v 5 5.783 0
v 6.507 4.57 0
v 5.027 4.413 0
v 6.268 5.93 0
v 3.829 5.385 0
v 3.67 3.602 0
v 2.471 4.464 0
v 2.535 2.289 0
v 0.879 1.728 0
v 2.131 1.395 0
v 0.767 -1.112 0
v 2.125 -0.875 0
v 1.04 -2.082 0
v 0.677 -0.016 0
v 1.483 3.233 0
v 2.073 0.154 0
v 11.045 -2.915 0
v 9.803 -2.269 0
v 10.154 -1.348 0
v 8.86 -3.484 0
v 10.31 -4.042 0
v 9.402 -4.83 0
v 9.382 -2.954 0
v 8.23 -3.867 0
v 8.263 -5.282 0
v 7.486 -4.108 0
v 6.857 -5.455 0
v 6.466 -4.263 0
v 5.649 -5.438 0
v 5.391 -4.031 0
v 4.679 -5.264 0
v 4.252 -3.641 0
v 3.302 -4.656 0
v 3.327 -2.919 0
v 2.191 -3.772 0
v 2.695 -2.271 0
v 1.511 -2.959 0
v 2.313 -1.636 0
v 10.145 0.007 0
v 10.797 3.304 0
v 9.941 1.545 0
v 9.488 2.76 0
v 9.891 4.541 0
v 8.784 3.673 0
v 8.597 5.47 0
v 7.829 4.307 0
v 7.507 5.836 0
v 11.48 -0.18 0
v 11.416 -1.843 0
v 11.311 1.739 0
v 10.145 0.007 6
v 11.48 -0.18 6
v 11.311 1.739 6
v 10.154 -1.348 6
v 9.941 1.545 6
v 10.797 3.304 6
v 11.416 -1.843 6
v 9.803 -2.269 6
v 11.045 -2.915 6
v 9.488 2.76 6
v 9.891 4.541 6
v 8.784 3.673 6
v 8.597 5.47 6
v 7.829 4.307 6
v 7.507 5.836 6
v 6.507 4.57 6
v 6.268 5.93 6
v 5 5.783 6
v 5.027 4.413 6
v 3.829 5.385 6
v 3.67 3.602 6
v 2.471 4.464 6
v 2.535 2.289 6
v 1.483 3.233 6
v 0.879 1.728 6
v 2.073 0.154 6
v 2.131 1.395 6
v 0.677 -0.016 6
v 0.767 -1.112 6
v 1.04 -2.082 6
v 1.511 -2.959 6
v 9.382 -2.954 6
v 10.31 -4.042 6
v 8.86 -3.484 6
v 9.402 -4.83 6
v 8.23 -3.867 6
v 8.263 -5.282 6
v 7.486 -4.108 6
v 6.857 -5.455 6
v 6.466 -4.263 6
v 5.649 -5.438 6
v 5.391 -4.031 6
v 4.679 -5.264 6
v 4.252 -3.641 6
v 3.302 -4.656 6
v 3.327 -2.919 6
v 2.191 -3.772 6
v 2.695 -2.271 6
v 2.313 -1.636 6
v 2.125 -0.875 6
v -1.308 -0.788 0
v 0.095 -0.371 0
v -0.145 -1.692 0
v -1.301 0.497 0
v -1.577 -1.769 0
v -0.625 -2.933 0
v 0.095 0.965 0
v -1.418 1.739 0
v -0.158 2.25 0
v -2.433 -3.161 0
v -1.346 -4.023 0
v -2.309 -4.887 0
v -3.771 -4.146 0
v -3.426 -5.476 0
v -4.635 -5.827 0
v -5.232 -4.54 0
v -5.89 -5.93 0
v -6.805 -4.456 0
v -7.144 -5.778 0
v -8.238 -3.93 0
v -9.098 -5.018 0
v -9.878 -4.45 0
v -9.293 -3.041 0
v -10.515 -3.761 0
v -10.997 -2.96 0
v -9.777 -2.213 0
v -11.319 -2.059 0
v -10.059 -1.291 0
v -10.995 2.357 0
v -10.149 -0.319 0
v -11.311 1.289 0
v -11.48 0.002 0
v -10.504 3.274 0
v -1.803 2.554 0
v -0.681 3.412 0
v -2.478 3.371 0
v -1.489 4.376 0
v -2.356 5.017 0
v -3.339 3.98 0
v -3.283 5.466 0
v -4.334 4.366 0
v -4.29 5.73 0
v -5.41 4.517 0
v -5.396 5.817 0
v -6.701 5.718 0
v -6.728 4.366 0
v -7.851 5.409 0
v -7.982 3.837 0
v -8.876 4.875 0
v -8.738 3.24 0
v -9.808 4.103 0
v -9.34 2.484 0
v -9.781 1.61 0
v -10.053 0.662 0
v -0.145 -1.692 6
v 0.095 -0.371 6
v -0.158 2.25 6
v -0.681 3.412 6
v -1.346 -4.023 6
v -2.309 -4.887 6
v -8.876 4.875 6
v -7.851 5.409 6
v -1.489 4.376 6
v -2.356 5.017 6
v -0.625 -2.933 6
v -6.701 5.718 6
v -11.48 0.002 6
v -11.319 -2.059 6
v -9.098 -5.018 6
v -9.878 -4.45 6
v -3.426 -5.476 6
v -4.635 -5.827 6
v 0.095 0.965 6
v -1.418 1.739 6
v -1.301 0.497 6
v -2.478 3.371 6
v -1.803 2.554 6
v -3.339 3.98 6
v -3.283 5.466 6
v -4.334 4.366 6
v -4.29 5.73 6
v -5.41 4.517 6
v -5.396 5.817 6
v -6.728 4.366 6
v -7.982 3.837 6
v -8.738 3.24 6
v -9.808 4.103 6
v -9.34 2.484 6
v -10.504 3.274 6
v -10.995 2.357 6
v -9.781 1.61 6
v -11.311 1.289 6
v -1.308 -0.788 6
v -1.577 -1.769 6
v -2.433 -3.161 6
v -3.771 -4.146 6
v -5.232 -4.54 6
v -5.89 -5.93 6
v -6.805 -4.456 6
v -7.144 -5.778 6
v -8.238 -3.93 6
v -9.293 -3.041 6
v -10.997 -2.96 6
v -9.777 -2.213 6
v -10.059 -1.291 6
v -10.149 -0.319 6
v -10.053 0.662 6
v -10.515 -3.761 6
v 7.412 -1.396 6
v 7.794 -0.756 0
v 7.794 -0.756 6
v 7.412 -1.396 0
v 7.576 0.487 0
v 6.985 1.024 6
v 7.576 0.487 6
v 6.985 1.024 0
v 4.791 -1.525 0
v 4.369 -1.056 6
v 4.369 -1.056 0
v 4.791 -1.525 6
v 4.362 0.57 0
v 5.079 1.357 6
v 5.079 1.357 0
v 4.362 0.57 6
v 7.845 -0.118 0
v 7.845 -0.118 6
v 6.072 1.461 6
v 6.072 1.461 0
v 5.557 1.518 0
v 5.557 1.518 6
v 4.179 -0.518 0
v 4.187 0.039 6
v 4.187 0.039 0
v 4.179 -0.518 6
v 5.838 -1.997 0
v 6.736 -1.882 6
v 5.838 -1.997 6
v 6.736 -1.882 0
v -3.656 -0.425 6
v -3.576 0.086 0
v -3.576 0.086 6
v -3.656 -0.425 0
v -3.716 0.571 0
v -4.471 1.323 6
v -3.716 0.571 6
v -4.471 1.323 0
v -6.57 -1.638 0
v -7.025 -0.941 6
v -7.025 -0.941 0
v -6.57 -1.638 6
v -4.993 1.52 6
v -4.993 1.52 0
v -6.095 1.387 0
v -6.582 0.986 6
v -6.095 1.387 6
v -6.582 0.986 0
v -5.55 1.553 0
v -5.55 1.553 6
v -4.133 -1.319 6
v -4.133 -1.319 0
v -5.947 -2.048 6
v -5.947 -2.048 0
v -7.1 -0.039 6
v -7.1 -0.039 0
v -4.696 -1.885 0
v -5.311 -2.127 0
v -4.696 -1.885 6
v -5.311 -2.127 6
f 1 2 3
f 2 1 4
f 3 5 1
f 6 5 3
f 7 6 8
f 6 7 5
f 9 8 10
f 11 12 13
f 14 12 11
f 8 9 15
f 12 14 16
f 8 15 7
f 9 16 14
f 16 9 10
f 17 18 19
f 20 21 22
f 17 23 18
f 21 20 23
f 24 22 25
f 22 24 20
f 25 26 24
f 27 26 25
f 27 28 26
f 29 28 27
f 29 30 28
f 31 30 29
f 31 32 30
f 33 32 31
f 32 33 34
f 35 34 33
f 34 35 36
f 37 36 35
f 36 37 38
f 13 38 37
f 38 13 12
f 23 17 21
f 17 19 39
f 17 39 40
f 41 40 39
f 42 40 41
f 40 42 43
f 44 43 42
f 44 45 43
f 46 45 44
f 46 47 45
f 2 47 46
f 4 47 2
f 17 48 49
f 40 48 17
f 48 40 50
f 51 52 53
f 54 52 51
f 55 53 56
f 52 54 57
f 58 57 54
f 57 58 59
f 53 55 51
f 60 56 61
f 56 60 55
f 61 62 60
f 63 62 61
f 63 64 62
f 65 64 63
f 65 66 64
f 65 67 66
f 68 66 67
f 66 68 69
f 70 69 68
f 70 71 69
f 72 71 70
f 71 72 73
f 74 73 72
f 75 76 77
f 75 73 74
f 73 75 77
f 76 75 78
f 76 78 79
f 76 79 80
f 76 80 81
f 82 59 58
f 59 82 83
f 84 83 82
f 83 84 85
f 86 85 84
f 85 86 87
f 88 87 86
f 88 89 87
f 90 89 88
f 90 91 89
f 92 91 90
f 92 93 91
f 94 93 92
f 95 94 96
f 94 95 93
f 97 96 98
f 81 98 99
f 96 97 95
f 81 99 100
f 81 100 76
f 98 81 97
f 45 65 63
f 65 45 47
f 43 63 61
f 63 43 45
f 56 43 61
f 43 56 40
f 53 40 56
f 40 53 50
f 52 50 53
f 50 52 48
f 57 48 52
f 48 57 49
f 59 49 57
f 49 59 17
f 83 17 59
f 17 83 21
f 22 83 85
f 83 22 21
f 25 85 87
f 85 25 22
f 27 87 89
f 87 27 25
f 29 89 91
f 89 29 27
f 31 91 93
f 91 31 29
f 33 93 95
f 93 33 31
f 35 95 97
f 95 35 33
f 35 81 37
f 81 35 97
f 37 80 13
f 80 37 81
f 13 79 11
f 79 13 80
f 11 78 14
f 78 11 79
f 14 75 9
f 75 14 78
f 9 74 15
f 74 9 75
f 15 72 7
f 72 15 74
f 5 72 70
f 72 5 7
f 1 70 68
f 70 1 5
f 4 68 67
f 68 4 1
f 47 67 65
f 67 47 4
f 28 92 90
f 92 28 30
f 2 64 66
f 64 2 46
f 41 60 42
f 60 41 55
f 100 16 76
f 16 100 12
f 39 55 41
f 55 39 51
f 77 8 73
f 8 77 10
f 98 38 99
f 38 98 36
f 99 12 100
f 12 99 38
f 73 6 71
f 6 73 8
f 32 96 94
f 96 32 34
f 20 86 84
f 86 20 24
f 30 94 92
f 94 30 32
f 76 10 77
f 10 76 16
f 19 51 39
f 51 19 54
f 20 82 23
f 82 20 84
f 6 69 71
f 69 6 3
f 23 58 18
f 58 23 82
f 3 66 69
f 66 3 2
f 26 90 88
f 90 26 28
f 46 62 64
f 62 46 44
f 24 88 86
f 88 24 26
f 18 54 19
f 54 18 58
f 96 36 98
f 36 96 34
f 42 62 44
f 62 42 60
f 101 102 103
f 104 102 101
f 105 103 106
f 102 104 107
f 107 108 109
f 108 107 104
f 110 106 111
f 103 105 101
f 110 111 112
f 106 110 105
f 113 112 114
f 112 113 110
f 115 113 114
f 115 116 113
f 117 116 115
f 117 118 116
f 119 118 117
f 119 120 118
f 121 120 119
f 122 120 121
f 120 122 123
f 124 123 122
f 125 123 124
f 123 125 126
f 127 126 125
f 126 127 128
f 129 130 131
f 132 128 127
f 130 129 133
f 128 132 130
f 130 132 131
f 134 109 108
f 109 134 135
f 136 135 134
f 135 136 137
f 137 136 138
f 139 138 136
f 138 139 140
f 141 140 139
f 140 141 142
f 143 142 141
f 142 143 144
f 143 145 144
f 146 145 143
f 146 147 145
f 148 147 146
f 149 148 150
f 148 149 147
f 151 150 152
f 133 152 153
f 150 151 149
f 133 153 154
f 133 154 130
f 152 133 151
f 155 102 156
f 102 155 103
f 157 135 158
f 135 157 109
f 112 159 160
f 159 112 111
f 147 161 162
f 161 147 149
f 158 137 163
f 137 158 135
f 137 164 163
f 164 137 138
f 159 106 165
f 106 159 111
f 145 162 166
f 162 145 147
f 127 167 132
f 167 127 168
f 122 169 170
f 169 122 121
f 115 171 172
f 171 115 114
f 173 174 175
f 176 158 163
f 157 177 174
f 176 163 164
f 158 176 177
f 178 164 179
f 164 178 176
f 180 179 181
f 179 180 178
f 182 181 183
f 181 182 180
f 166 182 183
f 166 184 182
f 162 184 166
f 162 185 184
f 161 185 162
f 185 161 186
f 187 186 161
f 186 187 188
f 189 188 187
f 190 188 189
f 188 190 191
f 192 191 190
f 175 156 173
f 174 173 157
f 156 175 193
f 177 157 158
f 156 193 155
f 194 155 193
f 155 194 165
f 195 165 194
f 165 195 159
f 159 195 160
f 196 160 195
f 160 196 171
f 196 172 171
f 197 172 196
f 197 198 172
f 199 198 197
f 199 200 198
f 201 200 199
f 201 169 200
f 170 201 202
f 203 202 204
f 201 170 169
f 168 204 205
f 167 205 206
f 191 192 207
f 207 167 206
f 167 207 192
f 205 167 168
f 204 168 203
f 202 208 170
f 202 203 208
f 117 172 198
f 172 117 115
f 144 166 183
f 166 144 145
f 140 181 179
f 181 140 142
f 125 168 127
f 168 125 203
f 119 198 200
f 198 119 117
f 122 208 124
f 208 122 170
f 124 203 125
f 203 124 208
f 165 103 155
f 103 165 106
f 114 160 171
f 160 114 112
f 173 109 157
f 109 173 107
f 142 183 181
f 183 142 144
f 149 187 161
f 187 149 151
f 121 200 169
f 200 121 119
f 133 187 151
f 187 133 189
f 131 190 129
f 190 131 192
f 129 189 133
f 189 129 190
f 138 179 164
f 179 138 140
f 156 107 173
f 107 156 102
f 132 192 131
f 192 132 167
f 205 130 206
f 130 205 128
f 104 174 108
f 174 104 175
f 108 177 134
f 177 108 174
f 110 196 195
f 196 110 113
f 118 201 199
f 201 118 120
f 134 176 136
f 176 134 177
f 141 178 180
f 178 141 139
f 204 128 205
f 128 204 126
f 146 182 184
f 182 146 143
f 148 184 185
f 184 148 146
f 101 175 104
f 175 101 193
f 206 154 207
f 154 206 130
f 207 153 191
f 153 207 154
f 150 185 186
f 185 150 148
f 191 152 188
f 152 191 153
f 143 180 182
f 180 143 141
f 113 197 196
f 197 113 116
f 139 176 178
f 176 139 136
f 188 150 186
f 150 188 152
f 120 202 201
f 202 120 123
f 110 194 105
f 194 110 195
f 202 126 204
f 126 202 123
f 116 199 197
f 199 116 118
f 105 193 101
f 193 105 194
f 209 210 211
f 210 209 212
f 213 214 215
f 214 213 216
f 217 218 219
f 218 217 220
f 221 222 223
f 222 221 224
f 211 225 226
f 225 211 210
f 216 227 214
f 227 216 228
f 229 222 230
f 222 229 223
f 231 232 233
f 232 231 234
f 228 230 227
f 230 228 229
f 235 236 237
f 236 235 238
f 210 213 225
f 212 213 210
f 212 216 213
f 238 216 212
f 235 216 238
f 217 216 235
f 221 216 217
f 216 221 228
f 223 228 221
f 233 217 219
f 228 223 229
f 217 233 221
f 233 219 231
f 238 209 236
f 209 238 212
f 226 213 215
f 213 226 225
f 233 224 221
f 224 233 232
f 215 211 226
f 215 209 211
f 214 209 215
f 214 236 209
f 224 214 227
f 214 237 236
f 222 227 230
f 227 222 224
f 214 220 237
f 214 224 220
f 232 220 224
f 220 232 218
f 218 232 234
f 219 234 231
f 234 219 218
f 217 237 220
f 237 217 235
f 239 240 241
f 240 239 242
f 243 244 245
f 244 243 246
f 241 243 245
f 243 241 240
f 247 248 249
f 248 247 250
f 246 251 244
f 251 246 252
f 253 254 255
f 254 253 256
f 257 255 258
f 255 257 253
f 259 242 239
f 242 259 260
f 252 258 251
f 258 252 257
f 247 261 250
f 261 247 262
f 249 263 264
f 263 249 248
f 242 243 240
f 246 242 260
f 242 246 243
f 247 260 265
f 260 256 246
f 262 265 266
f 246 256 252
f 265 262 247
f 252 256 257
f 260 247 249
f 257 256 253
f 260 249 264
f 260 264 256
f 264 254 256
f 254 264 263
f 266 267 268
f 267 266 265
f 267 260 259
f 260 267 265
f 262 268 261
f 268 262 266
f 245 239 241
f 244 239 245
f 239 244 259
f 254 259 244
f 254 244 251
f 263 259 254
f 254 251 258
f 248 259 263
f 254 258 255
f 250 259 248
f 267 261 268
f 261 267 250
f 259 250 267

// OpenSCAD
// Module names are of the form poly_<inkscape-path-id>().  As a result,
// you can associate a polygon in this OpenSCAD program with the corresponding
// SVG element in the Inkscape document by looking for the XML element with
// the attribute id="inkscape-path-id".

// fudge value is used to ensure that subtracted solids are a tad taller
// in the z dimension than the polygon being subtracted from.  This helps
// keep the resulting .stl file manifold.
fudge = 0.1;

module poly_path42145(h)
{
  scale([25.4/90, -25.4/90, 1]) union()
  {
    linear_extrude(height=h)
      polygon([[16.975936,5.402043],[15.481627,3.740043],[14.806743,1.836451],[14.836070,-0.139415],[15.454396,-2.018240],[17.997194,-4.807503],[19.691241,-5.379309],[21.513436,-5.176810],[24.750972,-3.627842],[26.842875,-1.724538],[27.795736,0.416772],[27.616146,2.679759],[26.263738,4.947241],[23.866657,6.668187],[20.684269,7.075490],[16.975936,5.402043]]);
  }
}

module poly_path42135(h)
{
  scale([25.4/90, -25.4/90, 1]) union()
  {
    difference()
    {
       linear_extrude(height=h)
         polygon([[22.210646,-21.013376],[17.717115,-20.492577],[13.566742,-19.079263],[8.756918,-15.816155],[5.253184,-11.455984],[3.114065,-6.123400],[2.398085,0.056945],[2.717004,3.939232],[3.686351,7.378310],[5.352910,10.484114],[7.763467,13.366580],[11.699198,16.496950],[16.579761,18.650928],[20.017741,19.268236],[24.297555,19.329176],[29.279805,18.714183],[33.314145,17.112765],[36.531258,14.322790],[39.134211,10.330312],[39.134211,10.329358],[40.449703,6.530998],[40.676091,0.639204],[40.078966,-6.162246],[38.256564,-11.706160],[35.047090,-16.090655],[30.461400,-19.383007],[26.601210,-20.680165],[22.210646,-21.013400]]);
       translate([0, 0, -fudge])
         linear_extrude(height=h+2*fudge)
           polygon([[23.057526,-16.193925],[27.739118,-15.259471],[31.125396,-13.013081],[33.619149,-9.778395],[35.224855,-5.475406],[35.946989,-0.024108],[35.980475,4.774671],[34.736773,8.041233],[33.243014,10.465672],[31.392197,12.344788],[29.160532,13.700428],[26.524227,14.554439],[22.911323,15.106620],[19.100795,14.284257],[15.065340,12.900076],[11.788219,10.343353],[9.548471,8.047371],[8.195529,5.797919],[7.528636,3.099119],[7.347039,-0.544905],[7.551717,-4.941524],[8.983032,-8.109947],[13.005620,-12.763175],[17.810441,-15.637724],[23.057526,-16.193925]]);
    }
    difference()
    {
       linear_extrude(height=h)
         polygon([[-19.119446,-20.611836],[-23.745369,-20.261470],[-27.819338,-19.165220],[-31.451890,-17.274146],[-34.753563,-14.539304],[-37.218446,-11.600874],[-38.959477,-8.353235],[-40.078183,-4.565873],[-40.676091,-0.008272],[-40.107587,7.295253],[-38.966342,10.488185],[-37.257854,13.327446],[-35.001943,15.767464],[-32.237705,17.779160],[-25.312150,20.473246],[-20.871271,21.013400],[-16.424257,20.646466],[-12.138841,19.403576],[-8.182757,17.315865],[-4.768253,14.254922],[-2.214335,10.394044],[-0.515087,5.993548],[0.335408,1.313750],[0.334932,-3.418110],[-0.561611,-7.973385],[-2.412726,-12.089655],[-5.276921,-15.504501],[-8.347599,-17.776829],[-11.631820,-19.366914],[-15.199224,-20.302626],[-19.119446,-20.611836]]);
       translate([0, 0, -fudge])
         linear_extrude(height=h+2*fudge)
           polygon([[-19.170676,-16.003866],[-15.358119,-15.471583],[-11.831973,-14.102429],[-8.779370,-11.945525],[-6.387443,-9.049990],[-5.025890,-6.163522],[-4.608920,-1.760717],[-4.633128,2.790888],[-5.588073,6.269226],[-8.620829,11.201461],[-13.362726,14.690462],[-18.538814,16.086446],[-24.112190,15.789812],[-29.188702,13.925484],[-32.929390,10.776576],[-34.641317,7.839856],[-35.641977,4.574707],[-35.959493,1.129624],[-35.621985,-2.346895],[-34.657576,-5.706353],[-33.094385,-8.800255],[-30.960535,-11.480103],[-28.284147,-13.597400],[-23.839890,-15.471656],[-19.170676,-16.003866]]);
    }
  }
}

module poly_path4214(h)
{
  scale([25.4/90, -25.4/90, 1]) union()
  {
    linear_extrude(height=h)
      polygon([[-23.322284,-3.493599],[-21.595950,-4.913097],[-19.664428,-5.503304],[-17.691782,-5.386796],[-15.842080,-4.686146],[-13.167766,-2.022714],[-12.671287,-0.305080],[-12.954014,1.506401],[-14.644369,4.672416],[-16.638149,6.678276],[-18.819429,7.535698],[-21.072284,7.256401],[-23.277865,5.805229],[-24.891335,3.334526],[-25.157778,0.137260],[-23.322284,-3.493599]]);
  }
}

poly_path42145(6);
poly_path42135(6);
poly_path4214(6);
